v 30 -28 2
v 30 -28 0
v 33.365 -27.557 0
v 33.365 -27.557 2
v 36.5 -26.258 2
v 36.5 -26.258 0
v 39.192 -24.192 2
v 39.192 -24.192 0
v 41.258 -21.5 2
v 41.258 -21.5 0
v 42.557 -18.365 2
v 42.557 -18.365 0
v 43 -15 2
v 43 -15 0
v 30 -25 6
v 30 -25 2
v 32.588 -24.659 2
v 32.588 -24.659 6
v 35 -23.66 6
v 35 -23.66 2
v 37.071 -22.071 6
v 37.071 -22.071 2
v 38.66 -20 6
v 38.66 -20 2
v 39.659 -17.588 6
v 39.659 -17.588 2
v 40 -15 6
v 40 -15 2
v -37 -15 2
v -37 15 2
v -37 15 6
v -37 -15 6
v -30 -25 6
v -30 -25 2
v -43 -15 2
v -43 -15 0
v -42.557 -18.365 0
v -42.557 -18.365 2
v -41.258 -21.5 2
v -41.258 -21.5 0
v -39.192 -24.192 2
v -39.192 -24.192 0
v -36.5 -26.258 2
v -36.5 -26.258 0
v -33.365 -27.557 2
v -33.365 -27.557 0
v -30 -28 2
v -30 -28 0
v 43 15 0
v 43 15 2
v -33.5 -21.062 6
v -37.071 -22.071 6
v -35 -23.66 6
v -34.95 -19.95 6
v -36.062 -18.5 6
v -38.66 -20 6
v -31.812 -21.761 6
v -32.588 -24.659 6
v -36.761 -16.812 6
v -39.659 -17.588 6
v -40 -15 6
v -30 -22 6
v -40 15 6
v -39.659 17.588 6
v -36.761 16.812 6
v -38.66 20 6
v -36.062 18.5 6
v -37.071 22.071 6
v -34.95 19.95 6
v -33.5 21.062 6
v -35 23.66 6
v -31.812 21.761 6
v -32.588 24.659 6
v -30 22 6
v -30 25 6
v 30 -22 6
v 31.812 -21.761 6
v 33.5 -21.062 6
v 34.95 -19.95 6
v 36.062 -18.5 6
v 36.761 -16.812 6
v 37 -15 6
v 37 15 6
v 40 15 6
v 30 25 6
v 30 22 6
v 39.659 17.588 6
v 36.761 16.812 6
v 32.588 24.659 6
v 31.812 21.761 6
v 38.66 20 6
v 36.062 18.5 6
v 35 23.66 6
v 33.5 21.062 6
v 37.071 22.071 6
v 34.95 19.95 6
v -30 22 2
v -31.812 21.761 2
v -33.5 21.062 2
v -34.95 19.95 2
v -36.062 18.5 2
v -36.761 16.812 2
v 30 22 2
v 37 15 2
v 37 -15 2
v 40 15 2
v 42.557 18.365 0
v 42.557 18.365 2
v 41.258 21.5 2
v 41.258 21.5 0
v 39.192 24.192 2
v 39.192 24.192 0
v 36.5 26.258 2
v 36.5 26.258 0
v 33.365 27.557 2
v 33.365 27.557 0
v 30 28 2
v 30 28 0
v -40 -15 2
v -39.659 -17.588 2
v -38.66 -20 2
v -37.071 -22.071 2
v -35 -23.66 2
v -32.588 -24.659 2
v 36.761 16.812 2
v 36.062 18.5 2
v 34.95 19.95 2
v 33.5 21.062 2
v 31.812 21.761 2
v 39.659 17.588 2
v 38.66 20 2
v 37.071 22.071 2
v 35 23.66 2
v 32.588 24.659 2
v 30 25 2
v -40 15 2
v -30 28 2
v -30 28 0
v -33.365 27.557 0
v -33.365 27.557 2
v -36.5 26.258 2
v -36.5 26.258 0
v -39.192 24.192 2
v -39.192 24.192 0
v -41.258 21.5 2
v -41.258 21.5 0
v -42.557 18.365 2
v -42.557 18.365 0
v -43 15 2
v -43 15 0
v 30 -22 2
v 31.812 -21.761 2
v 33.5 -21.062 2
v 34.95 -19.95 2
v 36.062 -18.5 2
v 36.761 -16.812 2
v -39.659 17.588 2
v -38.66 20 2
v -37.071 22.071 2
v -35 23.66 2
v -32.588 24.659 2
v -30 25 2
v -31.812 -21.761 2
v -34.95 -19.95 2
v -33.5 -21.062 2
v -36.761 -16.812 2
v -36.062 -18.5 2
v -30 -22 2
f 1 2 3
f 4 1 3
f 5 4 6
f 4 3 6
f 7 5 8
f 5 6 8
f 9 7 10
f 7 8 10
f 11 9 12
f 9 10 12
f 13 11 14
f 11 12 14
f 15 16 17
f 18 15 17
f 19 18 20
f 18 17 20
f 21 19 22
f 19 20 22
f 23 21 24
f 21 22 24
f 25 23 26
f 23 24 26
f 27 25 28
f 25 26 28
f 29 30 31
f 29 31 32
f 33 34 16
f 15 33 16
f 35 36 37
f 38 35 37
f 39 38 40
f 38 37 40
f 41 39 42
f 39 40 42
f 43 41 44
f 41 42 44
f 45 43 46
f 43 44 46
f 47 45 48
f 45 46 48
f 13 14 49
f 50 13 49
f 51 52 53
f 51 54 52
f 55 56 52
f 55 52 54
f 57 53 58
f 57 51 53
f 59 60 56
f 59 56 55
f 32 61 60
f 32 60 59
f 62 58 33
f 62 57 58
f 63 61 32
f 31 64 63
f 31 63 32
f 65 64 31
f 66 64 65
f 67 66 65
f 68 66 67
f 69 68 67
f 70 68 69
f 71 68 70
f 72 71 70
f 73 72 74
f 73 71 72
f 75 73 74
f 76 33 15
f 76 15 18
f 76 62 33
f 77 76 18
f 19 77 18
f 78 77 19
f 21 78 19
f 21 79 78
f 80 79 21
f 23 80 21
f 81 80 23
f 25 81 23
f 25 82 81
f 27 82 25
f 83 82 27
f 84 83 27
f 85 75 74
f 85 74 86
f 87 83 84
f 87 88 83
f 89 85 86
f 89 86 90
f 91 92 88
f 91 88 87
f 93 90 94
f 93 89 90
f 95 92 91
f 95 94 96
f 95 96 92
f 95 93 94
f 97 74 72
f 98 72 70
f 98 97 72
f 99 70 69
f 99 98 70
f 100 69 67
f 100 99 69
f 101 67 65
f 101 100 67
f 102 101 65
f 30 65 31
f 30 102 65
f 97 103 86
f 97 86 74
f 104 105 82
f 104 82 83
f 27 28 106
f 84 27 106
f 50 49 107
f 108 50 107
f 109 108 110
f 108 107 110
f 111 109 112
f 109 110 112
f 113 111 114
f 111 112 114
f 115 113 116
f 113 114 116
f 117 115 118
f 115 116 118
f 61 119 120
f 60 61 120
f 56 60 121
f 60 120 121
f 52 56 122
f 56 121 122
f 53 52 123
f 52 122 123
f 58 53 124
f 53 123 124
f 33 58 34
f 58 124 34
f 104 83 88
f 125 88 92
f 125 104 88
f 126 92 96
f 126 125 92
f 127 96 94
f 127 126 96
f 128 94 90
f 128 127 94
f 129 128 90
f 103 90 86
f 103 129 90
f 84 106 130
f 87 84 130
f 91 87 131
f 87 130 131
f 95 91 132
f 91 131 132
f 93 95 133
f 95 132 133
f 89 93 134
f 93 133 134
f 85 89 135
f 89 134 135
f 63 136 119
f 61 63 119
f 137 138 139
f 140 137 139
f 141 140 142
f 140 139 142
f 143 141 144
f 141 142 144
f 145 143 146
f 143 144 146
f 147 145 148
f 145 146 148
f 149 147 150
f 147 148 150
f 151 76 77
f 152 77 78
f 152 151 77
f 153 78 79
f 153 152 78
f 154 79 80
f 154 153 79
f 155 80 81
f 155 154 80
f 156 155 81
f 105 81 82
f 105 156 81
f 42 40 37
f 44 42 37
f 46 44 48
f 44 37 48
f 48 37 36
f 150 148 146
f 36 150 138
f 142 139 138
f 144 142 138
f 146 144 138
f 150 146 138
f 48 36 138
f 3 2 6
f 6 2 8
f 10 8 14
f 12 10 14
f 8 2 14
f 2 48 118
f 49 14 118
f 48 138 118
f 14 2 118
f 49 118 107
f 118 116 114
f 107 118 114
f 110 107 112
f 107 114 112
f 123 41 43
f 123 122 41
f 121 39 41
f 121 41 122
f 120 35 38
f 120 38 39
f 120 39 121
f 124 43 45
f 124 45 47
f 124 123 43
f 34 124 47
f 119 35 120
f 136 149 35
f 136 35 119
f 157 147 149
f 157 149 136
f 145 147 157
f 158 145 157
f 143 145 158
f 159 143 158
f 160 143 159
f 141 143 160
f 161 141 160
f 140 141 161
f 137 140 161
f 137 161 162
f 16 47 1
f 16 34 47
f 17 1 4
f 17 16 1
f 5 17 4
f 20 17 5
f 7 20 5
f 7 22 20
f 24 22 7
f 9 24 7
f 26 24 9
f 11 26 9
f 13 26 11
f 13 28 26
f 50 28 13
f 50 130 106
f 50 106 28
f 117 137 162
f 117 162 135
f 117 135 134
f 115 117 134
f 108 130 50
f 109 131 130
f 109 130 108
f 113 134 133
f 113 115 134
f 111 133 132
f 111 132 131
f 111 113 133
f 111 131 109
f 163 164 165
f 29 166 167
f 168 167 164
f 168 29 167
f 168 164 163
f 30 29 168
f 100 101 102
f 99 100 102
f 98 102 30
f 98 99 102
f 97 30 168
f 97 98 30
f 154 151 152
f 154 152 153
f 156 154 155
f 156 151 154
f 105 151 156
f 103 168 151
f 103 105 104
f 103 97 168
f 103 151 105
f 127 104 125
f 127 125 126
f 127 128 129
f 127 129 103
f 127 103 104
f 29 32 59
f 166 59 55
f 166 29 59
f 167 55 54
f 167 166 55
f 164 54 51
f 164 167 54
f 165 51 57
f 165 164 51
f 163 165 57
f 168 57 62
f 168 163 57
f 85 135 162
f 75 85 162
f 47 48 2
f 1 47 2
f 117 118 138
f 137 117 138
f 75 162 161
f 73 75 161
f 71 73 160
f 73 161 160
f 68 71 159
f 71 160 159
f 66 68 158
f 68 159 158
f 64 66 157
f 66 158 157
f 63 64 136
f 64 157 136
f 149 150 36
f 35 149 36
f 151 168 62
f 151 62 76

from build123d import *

# Parameters (mm, degrees)
PAD_DEPTH    = 2
PAD001_DEPTH = 6
POCKET_DEPTH = 5


with BuildPart() as part:
    # Sketch001 → Pad (new body)
    with BuildSketch(Plane.XY):
        with BuildLine():
            Line((-43, 15), (-43, -15))
            ThreePointArc((-43, -15), (-39.192388, -24.192388), (-30, -28))
            Line((-30, -28), (30, -28))
            ThreePointArc((30, -28), (39.192388, -24.192388), (43, -15))
            Line((43, -15), (43, 15))
            ThreePointArc((43, 15), (39.192388, 24.192388), (30, 28))
            Line((30, 28), (-30, 28))
            ThreePointArc((-30, 28), (-39.192388, 24.192388), (-43, 15))
        make_face()
    extrude(amount=PAD_DEPTH)

    # Sketch004 → Pad001 (join)
    with BuildSketch(Plane.XY):
        with BuildLine():
            Line((-40, 15), (-40, -15))
            ThreePointArc((-40, -15), (-37.071068, -22.071068), (-30, -25))
            Line((-30, -25), (30, -25))
            ThreePointArc((30, -25), (37.071068, -22.071068), (40, -15))
            Line((40, -15), (40, 15))
            ThreePointArc((40, 15), (37.071068, 22.071068), (30, 25))
            Line((30, 25), (-30, 25))
            ThreePointArc((-30, 25), (-37.071068, 22.071068), (-40, 15))
        make_face()
    extrude(amount=PAD001_DEPTH)

    # Sketch005 → Pocket (cut)
    with BuildSketch(Plane.XY.offset(2)):
        with BuildLine():
            Line((-37, 15), (-37, -15))
            ThreePointArc((-37, -15), (-34.949747, -19.949747), (-30, -22))
            Line((-30, -22), (30, -22))
            ThreePointArc((30, -22), (34.949747, -19.949747), (37, -15))
            Line((37, -15), (37, 15))
            ThreePointArc((37, 15), (34.949747, 19.949747), (30, 22))
            Line((30, 22), (-30, 22))
            ThreePointArc((-30, 22), (-34.949747, 19.949747), (-37, 15))
        make_face()
    extrude(amount=POCKET_DEPTH, mode=Mode.SUBTRACT)


solid = part.part
